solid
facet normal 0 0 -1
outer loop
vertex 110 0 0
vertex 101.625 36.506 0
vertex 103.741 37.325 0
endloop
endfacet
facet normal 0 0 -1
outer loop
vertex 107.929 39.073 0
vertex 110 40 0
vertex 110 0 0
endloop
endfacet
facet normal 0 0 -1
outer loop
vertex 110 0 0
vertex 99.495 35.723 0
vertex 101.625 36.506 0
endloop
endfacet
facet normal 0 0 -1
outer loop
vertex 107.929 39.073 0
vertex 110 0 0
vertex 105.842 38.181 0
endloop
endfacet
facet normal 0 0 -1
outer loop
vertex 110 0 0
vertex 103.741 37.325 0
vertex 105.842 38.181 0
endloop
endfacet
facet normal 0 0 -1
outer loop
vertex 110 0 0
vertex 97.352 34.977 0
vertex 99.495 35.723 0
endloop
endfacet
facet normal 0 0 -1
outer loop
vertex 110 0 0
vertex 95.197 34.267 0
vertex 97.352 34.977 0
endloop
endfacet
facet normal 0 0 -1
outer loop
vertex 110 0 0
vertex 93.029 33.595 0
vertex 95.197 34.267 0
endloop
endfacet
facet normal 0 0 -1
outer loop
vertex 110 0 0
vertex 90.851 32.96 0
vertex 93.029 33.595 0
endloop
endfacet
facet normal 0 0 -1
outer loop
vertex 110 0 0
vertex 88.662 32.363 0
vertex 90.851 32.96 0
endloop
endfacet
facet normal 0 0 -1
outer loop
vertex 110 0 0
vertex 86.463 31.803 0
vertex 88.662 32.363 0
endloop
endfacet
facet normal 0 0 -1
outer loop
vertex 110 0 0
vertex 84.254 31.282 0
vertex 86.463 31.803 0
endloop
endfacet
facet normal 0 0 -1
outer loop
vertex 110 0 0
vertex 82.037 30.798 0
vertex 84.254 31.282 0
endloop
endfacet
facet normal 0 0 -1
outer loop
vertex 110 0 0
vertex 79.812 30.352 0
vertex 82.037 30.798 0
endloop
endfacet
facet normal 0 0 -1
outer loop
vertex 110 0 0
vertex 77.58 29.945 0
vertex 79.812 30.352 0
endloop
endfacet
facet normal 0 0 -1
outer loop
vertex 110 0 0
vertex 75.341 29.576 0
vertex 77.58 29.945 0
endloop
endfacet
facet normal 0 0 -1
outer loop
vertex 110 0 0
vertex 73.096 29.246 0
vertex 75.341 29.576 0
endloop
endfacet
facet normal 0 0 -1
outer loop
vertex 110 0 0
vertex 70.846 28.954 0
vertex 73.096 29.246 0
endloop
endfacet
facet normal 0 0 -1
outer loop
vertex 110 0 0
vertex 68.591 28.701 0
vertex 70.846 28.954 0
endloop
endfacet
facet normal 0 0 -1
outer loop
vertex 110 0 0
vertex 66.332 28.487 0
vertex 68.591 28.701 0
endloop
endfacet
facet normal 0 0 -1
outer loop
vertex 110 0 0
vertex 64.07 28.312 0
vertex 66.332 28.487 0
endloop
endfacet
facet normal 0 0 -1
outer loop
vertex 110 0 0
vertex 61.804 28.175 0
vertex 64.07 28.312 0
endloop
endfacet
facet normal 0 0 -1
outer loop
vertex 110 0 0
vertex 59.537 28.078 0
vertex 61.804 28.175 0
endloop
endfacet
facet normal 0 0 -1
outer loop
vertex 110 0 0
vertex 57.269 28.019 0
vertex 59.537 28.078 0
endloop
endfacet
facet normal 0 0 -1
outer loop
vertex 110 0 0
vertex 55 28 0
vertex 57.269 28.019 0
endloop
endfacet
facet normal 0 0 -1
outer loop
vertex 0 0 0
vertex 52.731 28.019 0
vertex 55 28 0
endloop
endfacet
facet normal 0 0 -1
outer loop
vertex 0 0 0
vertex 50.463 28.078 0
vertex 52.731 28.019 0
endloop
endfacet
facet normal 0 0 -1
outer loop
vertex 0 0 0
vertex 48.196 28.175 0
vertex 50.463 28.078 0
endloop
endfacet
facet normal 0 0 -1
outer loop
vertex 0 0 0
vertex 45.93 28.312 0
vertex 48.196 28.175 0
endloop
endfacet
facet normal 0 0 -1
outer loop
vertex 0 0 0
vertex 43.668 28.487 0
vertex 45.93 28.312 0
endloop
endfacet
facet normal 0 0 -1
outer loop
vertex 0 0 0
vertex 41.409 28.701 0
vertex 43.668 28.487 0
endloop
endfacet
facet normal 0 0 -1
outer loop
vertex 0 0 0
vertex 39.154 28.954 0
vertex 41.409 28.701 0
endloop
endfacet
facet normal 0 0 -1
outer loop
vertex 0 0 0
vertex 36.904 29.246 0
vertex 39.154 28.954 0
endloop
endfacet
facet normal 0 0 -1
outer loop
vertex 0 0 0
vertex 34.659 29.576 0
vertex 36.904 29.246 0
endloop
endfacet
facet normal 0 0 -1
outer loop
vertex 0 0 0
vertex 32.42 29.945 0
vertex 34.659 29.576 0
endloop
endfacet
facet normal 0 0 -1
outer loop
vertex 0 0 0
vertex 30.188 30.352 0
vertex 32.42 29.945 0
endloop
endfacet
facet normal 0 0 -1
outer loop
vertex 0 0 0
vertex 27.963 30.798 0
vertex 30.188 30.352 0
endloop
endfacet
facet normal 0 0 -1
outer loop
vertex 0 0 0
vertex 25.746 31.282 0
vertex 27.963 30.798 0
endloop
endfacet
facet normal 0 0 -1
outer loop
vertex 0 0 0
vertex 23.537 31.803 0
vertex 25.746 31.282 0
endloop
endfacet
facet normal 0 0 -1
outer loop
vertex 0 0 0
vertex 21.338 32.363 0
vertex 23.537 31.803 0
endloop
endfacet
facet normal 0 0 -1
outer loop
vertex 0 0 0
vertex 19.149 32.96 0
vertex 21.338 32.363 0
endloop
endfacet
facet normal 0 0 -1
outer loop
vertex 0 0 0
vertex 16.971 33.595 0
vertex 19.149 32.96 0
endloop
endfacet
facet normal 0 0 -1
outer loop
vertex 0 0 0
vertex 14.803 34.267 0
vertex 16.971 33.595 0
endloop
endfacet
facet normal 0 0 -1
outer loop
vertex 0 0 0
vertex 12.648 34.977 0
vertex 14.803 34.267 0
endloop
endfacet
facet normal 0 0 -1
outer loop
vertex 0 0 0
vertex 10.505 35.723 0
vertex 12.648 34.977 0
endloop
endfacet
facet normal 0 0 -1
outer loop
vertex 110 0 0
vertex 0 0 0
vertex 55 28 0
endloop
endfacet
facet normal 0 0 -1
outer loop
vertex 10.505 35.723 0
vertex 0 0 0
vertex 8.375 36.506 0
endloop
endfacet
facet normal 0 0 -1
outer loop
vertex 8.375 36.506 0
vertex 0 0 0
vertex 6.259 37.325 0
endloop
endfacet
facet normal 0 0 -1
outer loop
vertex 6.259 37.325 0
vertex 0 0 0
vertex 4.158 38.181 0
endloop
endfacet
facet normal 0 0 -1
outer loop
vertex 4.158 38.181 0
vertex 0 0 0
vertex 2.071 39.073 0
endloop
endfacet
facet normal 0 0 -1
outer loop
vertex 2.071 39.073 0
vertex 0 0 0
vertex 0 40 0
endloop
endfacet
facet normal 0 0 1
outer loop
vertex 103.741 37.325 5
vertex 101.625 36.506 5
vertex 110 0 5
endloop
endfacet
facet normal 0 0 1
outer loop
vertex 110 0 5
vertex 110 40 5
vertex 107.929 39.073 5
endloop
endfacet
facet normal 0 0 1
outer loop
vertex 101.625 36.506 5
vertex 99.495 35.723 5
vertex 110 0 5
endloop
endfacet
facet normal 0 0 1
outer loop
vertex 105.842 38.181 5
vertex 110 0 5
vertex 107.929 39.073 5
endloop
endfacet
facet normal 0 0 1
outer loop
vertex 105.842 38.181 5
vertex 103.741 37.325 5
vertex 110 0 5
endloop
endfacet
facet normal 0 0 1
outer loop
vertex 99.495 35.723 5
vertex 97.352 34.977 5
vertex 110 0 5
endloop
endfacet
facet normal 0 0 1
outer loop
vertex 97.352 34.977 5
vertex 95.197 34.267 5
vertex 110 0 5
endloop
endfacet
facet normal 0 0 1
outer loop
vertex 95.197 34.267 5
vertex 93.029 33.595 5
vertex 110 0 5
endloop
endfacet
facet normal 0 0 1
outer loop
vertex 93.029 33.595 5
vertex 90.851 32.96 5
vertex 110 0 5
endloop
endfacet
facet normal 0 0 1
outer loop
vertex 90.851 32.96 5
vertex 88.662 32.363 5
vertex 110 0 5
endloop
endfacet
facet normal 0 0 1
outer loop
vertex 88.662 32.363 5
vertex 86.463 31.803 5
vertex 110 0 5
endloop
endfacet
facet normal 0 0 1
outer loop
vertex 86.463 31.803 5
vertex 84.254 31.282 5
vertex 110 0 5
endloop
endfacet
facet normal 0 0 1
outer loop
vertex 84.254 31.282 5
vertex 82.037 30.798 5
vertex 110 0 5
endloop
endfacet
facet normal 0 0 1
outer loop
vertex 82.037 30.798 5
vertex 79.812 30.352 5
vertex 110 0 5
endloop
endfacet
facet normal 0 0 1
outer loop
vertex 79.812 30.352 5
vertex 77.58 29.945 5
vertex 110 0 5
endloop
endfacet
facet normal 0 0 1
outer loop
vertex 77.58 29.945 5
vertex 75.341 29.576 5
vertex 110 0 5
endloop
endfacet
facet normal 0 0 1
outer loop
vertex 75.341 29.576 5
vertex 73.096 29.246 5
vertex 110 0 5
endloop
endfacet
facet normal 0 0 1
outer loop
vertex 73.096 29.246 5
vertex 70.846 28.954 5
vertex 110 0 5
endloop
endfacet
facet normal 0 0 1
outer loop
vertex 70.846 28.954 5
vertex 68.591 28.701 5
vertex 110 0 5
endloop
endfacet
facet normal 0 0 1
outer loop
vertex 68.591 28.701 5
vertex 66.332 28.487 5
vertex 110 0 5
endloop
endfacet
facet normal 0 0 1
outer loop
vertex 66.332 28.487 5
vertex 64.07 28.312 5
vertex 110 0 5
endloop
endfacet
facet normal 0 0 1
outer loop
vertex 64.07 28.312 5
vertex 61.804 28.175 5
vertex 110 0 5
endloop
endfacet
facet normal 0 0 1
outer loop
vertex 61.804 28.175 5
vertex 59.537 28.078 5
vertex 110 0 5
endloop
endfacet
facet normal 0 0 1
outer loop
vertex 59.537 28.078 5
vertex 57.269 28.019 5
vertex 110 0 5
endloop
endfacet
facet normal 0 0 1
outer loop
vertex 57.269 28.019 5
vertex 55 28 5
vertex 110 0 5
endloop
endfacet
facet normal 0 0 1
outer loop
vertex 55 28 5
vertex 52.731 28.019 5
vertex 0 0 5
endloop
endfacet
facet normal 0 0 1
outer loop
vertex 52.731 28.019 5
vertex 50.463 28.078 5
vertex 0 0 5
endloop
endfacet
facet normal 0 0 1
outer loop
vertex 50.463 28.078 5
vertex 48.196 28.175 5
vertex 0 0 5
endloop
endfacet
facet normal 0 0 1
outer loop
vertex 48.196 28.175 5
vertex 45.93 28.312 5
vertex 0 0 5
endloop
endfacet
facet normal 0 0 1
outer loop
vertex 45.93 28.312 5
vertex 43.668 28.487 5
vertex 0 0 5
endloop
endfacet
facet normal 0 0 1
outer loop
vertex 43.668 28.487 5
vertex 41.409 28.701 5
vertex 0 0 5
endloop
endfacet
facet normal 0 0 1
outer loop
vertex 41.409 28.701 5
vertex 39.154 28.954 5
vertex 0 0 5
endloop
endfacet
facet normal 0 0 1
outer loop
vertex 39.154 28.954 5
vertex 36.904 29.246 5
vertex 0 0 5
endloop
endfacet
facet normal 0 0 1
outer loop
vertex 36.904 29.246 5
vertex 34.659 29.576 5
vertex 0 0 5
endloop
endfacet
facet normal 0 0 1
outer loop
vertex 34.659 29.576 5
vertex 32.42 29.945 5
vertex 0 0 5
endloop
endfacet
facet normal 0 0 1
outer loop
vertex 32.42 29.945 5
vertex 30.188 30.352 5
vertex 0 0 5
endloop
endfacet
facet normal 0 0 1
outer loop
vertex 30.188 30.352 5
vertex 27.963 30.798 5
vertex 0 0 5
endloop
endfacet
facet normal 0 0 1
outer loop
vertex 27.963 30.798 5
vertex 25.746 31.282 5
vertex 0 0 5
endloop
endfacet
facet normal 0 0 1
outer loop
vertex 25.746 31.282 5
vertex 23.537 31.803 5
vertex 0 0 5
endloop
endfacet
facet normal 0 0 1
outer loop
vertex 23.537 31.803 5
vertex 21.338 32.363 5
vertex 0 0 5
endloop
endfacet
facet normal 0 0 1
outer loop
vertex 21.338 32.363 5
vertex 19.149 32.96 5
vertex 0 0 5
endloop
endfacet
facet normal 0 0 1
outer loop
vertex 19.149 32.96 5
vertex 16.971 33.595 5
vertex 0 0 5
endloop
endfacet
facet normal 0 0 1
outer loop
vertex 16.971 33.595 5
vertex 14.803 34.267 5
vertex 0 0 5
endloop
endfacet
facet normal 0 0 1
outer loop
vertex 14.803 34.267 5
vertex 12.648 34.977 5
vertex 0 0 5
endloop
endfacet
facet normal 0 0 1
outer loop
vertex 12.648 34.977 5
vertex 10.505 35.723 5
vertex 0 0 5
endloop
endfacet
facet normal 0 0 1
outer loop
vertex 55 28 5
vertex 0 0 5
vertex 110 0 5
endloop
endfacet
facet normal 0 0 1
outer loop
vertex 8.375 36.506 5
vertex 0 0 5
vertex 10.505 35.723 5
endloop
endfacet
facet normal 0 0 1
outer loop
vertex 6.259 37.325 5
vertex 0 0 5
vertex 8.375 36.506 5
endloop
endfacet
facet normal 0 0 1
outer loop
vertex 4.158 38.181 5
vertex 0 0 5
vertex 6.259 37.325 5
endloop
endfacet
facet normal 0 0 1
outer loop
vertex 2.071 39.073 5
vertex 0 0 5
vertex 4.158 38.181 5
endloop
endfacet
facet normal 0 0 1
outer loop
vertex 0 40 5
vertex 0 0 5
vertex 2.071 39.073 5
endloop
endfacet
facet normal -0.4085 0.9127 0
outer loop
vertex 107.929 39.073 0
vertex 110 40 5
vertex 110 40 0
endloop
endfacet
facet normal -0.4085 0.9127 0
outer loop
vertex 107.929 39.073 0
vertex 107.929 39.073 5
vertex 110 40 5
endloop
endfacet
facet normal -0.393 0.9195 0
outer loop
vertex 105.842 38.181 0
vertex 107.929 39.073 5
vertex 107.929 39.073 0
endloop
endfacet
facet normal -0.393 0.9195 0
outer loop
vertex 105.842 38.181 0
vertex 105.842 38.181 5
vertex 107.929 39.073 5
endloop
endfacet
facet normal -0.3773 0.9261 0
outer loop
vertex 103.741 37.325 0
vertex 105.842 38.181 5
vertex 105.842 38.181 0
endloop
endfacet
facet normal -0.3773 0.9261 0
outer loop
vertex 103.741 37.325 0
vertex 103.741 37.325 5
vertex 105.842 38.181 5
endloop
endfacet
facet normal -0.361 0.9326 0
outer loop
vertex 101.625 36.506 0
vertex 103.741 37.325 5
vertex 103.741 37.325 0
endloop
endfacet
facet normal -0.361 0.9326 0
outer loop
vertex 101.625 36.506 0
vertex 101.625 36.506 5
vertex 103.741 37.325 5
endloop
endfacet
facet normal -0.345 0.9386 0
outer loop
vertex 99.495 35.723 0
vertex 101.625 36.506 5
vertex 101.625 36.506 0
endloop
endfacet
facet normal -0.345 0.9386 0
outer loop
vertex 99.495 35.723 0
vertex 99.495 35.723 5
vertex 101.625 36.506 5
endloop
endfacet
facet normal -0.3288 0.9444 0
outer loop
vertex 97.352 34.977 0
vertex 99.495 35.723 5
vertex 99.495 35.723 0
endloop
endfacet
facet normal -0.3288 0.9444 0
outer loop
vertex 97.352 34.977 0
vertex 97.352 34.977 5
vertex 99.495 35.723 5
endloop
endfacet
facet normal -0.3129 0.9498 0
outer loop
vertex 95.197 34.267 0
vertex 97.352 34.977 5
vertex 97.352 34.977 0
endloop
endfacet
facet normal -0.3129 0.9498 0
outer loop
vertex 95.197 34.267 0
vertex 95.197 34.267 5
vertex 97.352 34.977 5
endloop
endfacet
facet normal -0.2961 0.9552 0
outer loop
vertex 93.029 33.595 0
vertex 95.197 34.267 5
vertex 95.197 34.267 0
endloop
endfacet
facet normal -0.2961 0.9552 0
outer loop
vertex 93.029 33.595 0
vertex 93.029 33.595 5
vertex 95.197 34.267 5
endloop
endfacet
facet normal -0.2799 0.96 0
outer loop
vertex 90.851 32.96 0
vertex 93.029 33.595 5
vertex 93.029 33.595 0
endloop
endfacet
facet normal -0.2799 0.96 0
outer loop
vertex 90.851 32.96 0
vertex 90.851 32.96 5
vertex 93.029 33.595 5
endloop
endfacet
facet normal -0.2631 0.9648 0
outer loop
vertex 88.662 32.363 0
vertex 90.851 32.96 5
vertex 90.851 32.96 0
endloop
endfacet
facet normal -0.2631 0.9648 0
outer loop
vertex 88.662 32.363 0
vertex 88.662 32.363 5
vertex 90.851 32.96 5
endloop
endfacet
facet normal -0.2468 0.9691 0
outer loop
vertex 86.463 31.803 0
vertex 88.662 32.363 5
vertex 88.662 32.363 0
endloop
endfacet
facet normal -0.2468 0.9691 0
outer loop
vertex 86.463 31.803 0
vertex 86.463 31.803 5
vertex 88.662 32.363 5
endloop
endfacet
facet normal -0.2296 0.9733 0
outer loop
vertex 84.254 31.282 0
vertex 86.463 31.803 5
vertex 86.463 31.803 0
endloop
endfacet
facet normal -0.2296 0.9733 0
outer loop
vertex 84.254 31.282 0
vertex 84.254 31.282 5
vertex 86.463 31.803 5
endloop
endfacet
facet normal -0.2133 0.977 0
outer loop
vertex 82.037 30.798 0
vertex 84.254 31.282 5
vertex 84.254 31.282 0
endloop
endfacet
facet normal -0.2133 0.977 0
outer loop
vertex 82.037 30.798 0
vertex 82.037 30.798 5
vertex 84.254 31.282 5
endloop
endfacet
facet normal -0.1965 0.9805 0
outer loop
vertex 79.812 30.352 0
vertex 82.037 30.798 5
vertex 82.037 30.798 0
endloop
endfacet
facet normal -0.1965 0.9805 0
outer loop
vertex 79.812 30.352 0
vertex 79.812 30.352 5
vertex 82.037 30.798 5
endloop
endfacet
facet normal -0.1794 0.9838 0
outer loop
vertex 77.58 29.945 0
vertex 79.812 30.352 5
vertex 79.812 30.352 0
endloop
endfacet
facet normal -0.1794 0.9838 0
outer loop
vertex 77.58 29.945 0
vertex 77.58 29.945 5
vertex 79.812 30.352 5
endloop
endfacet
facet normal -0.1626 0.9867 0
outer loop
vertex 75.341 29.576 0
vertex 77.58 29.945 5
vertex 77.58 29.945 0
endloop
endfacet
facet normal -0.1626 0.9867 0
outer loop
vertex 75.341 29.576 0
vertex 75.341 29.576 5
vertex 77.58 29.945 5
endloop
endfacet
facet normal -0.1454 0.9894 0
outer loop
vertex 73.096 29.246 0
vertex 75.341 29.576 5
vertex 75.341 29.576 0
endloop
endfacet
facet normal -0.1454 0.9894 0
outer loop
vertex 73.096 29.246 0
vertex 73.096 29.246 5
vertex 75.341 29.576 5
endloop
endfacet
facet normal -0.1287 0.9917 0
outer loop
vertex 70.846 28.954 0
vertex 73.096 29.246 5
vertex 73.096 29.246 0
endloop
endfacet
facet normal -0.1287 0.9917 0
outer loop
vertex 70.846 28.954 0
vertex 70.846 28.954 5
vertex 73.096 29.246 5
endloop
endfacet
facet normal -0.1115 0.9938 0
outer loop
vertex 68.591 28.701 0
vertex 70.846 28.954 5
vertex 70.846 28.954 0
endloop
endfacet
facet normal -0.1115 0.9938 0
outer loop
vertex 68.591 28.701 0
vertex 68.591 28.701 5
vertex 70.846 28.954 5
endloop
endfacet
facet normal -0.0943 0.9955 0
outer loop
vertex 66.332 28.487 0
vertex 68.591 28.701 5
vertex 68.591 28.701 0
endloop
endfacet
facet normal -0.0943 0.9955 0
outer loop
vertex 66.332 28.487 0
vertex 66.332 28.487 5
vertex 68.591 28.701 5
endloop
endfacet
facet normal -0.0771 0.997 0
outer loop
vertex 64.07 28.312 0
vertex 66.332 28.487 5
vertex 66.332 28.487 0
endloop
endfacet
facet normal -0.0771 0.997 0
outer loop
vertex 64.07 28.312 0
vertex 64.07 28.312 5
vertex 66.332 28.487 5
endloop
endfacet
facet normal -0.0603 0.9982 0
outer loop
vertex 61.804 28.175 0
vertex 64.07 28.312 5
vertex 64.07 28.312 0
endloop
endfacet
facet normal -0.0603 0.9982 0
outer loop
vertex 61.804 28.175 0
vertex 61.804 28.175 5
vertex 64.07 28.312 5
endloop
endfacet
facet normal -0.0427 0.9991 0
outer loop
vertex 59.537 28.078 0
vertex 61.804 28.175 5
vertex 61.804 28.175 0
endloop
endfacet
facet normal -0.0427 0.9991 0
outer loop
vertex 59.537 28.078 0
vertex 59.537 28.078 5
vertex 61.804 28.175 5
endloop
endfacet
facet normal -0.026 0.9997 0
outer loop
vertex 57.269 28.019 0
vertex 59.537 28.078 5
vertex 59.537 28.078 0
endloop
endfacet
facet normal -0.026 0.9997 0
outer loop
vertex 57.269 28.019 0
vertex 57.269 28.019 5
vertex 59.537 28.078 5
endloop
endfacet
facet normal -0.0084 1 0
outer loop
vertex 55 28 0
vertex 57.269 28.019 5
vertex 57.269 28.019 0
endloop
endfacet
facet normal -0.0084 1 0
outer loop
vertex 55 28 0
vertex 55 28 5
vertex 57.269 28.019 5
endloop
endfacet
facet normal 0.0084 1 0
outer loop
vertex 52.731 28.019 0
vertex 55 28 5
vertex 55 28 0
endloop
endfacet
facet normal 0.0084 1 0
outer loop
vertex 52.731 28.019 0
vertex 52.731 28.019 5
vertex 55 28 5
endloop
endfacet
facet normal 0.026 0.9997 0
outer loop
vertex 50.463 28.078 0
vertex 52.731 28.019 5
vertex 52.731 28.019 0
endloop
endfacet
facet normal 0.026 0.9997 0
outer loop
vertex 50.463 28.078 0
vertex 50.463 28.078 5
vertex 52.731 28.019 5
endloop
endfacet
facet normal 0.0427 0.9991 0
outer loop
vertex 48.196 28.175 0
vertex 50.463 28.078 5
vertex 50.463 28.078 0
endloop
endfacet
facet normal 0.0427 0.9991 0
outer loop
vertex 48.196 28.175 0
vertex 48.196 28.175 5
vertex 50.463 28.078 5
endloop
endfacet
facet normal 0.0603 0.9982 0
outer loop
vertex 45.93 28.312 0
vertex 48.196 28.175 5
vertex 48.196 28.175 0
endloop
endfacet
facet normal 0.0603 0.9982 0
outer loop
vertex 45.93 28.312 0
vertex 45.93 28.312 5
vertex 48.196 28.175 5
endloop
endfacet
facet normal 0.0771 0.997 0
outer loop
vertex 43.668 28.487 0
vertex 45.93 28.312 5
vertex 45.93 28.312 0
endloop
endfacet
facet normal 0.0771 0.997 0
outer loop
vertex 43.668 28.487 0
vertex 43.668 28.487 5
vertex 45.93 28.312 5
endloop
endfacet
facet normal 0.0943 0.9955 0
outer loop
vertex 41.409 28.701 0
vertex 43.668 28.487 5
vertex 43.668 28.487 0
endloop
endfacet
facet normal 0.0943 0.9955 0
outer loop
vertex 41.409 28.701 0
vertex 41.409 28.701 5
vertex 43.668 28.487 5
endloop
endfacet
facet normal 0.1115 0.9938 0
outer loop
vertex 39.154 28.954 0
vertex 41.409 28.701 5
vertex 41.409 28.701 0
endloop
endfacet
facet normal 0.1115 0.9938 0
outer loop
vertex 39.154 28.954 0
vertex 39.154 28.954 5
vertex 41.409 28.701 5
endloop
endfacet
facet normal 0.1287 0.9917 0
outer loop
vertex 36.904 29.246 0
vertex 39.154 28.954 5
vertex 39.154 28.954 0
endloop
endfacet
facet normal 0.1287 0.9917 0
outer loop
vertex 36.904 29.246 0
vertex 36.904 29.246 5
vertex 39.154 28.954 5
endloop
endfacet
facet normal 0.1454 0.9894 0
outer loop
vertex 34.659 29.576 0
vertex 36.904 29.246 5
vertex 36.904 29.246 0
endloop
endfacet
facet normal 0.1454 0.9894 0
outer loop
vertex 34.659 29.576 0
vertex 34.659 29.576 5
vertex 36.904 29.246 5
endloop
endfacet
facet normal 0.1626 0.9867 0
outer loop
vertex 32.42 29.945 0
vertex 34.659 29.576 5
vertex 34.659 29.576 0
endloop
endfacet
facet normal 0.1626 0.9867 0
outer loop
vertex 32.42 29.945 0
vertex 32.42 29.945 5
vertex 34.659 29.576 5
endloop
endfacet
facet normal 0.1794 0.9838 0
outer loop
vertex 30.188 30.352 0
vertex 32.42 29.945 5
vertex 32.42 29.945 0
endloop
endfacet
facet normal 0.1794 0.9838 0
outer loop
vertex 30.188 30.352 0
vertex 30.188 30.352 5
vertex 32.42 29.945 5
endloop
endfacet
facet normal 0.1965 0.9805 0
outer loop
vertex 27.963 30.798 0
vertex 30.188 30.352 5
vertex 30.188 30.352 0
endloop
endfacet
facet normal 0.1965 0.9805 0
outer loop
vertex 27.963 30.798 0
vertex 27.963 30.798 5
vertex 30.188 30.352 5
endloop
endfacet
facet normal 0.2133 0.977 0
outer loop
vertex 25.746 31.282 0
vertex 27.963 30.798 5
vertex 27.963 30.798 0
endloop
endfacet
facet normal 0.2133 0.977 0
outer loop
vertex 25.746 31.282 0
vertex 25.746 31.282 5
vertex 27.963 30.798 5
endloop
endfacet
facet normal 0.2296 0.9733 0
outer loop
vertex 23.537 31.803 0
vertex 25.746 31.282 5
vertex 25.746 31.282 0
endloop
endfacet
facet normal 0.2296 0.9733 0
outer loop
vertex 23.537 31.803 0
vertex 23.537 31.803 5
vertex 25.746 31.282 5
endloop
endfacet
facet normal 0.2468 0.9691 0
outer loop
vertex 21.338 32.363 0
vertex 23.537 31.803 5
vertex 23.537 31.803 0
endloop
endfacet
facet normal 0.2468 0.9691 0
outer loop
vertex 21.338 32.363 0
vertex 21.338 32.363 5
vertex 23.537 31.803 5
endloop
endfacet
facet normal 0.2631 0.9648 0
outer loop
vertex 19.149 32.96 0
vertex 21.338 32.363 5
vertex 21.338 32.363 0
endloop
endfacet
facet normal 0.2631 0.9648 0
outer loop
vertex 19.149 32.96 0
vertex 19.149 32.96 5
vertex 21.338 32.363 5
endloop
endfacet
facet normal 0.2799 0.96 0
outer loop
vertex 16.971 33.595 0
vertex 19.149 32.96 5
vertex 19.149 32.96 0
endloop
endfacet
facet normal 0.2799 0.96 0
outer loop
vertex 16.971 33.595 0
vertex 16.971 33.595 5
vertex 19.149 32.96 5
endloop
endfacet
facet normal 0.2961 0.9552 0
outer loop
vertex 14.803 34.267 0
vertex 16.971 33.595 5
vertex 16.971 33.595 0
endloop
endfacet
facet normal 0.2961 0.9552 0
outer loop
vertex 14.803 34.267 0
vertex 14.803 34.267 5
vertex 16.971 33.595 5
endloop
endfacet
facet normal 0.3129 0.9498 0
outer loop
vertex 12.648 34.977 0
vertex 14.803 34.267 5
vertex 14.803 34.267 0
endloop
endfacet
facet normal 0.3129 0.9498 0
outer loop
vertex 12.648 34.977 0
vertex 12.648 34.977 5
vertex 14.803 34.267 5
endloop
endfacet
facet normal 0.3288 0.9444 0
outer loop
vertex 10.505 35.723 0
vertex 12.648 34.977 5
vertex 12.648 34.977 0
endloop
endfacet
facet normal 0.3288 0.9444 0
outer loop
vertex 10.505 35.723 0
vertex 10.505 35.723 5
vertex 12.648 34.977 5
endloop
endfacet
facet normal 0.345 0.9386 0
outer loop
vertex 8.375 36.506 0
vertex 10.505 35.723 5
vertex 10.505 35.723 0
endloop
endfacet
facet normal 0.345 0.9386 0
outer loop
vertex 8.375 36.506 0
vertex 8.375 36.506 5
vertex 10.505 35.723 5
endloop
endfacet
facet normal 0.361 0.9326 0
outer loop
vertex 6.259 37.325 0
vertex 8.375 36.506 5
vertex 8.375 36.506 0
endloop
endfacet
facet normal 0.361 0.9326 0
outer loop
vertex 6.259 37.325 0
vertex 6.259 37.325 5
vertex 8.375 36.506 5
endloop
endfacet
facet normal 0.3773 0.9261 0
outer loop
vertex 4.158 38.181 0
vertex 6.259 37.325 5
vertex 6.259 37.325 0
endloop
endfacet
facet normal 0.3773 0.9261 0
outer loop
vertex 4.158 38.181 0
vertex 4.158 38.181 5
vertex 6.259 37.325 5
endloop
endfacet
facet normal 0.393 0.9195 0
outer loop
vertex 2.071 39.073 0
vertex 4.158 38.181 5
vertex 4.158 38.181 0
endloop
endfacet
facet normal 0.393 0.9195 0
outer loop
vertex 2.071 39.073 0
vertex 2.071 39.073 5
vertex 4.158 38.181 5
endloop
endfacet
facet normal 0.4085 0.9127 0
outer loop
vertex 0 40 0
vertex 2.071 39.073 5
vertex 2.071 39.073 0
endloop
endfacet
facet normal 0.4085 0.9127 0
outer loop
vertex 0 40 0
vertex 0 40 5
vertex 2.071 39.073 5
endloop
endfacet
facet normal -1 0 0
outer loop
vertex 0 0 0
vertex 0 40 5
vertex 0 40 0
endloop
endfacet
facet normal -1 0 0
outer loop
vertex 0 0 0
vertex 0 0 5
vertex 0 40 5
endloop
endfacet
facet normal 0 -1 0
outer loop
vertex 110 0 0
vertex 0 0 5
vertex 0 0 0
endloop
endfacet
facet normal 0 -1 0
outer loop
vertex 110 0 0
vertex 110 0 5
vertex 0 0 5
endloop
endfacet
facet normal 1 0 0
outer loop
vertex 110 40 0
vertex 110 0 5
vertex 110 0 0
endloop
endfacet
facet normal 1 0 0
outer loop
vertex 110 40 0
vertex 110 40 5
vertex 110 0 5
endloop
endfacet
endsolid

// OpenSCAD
$fn = 32;

// ----------------------------------------------------------------------
// Arc profile plate: notch, 53 points
// ----------------------------------------------------------------------

// --- parameters (mm) ---
bar_l = 110;              // bar length, X
bar_w = 40;               // bar width, Y
notch_depth = 12;         // depth of the arc notch at mid-span
arc_r = 132.04;           // radius of the notch arc
arc_angle = 49.23;        // notch arc angle, degrees
arc_step = 1;             // sampling step of the notch arc, degrees
plate_t = 5;              // plate thickness, Z

profile = [[0, 0], [110, 0], [110, 40], [107.929, 39.073], [105.842, 38.181], [103.741, 37.325], [101.625, 36.506], [99.495, 35.723], [97.352, 34.977], [95.197, 34.267], [93.029, 33.595], [90.851, 32.96], [88.662, 32.363], [86.463, 31.803], [84.254, 31.282], [82.037, 30.798], [79.812, 30.352], [77.58, 29.945], [75.341, 29.576], [73.096, 29.246], [70.846, 28.954], [68.591, 28.701], [66.332, 28.487], [64.07, 28.312], [61.804, 28.175], [59.537, 28.078], [57.269, 28.019], [55, 28], [52.731, 28.019], [50.463, 28.078], [48.196, 28.175], [45.93, 28.312], [43.668, 28.487], [41.409, 28.701], [39.154, 28.954], [36.904, 29.246], [34.659, 29.576], [32.42, 29.945], [30.188, 30.352], [27.963, 30.798], [25.746, 31.282], [23.537, 31.803], [21.338, 32.363], [19.149, 32.96], [16.971, 33.595], [14.803, 34.267], [12.648, 34.977], [10.505, 35.723], [8.375, 36.506], [6.259, 37.325], [4.158, 38.181], [2.071, 39.073], [0, 40]];  // primary outline, 53 points, counter clockwise

// --- the one profile operation ---
linear_extrude(height = plate_t) polygon(points = profile);
